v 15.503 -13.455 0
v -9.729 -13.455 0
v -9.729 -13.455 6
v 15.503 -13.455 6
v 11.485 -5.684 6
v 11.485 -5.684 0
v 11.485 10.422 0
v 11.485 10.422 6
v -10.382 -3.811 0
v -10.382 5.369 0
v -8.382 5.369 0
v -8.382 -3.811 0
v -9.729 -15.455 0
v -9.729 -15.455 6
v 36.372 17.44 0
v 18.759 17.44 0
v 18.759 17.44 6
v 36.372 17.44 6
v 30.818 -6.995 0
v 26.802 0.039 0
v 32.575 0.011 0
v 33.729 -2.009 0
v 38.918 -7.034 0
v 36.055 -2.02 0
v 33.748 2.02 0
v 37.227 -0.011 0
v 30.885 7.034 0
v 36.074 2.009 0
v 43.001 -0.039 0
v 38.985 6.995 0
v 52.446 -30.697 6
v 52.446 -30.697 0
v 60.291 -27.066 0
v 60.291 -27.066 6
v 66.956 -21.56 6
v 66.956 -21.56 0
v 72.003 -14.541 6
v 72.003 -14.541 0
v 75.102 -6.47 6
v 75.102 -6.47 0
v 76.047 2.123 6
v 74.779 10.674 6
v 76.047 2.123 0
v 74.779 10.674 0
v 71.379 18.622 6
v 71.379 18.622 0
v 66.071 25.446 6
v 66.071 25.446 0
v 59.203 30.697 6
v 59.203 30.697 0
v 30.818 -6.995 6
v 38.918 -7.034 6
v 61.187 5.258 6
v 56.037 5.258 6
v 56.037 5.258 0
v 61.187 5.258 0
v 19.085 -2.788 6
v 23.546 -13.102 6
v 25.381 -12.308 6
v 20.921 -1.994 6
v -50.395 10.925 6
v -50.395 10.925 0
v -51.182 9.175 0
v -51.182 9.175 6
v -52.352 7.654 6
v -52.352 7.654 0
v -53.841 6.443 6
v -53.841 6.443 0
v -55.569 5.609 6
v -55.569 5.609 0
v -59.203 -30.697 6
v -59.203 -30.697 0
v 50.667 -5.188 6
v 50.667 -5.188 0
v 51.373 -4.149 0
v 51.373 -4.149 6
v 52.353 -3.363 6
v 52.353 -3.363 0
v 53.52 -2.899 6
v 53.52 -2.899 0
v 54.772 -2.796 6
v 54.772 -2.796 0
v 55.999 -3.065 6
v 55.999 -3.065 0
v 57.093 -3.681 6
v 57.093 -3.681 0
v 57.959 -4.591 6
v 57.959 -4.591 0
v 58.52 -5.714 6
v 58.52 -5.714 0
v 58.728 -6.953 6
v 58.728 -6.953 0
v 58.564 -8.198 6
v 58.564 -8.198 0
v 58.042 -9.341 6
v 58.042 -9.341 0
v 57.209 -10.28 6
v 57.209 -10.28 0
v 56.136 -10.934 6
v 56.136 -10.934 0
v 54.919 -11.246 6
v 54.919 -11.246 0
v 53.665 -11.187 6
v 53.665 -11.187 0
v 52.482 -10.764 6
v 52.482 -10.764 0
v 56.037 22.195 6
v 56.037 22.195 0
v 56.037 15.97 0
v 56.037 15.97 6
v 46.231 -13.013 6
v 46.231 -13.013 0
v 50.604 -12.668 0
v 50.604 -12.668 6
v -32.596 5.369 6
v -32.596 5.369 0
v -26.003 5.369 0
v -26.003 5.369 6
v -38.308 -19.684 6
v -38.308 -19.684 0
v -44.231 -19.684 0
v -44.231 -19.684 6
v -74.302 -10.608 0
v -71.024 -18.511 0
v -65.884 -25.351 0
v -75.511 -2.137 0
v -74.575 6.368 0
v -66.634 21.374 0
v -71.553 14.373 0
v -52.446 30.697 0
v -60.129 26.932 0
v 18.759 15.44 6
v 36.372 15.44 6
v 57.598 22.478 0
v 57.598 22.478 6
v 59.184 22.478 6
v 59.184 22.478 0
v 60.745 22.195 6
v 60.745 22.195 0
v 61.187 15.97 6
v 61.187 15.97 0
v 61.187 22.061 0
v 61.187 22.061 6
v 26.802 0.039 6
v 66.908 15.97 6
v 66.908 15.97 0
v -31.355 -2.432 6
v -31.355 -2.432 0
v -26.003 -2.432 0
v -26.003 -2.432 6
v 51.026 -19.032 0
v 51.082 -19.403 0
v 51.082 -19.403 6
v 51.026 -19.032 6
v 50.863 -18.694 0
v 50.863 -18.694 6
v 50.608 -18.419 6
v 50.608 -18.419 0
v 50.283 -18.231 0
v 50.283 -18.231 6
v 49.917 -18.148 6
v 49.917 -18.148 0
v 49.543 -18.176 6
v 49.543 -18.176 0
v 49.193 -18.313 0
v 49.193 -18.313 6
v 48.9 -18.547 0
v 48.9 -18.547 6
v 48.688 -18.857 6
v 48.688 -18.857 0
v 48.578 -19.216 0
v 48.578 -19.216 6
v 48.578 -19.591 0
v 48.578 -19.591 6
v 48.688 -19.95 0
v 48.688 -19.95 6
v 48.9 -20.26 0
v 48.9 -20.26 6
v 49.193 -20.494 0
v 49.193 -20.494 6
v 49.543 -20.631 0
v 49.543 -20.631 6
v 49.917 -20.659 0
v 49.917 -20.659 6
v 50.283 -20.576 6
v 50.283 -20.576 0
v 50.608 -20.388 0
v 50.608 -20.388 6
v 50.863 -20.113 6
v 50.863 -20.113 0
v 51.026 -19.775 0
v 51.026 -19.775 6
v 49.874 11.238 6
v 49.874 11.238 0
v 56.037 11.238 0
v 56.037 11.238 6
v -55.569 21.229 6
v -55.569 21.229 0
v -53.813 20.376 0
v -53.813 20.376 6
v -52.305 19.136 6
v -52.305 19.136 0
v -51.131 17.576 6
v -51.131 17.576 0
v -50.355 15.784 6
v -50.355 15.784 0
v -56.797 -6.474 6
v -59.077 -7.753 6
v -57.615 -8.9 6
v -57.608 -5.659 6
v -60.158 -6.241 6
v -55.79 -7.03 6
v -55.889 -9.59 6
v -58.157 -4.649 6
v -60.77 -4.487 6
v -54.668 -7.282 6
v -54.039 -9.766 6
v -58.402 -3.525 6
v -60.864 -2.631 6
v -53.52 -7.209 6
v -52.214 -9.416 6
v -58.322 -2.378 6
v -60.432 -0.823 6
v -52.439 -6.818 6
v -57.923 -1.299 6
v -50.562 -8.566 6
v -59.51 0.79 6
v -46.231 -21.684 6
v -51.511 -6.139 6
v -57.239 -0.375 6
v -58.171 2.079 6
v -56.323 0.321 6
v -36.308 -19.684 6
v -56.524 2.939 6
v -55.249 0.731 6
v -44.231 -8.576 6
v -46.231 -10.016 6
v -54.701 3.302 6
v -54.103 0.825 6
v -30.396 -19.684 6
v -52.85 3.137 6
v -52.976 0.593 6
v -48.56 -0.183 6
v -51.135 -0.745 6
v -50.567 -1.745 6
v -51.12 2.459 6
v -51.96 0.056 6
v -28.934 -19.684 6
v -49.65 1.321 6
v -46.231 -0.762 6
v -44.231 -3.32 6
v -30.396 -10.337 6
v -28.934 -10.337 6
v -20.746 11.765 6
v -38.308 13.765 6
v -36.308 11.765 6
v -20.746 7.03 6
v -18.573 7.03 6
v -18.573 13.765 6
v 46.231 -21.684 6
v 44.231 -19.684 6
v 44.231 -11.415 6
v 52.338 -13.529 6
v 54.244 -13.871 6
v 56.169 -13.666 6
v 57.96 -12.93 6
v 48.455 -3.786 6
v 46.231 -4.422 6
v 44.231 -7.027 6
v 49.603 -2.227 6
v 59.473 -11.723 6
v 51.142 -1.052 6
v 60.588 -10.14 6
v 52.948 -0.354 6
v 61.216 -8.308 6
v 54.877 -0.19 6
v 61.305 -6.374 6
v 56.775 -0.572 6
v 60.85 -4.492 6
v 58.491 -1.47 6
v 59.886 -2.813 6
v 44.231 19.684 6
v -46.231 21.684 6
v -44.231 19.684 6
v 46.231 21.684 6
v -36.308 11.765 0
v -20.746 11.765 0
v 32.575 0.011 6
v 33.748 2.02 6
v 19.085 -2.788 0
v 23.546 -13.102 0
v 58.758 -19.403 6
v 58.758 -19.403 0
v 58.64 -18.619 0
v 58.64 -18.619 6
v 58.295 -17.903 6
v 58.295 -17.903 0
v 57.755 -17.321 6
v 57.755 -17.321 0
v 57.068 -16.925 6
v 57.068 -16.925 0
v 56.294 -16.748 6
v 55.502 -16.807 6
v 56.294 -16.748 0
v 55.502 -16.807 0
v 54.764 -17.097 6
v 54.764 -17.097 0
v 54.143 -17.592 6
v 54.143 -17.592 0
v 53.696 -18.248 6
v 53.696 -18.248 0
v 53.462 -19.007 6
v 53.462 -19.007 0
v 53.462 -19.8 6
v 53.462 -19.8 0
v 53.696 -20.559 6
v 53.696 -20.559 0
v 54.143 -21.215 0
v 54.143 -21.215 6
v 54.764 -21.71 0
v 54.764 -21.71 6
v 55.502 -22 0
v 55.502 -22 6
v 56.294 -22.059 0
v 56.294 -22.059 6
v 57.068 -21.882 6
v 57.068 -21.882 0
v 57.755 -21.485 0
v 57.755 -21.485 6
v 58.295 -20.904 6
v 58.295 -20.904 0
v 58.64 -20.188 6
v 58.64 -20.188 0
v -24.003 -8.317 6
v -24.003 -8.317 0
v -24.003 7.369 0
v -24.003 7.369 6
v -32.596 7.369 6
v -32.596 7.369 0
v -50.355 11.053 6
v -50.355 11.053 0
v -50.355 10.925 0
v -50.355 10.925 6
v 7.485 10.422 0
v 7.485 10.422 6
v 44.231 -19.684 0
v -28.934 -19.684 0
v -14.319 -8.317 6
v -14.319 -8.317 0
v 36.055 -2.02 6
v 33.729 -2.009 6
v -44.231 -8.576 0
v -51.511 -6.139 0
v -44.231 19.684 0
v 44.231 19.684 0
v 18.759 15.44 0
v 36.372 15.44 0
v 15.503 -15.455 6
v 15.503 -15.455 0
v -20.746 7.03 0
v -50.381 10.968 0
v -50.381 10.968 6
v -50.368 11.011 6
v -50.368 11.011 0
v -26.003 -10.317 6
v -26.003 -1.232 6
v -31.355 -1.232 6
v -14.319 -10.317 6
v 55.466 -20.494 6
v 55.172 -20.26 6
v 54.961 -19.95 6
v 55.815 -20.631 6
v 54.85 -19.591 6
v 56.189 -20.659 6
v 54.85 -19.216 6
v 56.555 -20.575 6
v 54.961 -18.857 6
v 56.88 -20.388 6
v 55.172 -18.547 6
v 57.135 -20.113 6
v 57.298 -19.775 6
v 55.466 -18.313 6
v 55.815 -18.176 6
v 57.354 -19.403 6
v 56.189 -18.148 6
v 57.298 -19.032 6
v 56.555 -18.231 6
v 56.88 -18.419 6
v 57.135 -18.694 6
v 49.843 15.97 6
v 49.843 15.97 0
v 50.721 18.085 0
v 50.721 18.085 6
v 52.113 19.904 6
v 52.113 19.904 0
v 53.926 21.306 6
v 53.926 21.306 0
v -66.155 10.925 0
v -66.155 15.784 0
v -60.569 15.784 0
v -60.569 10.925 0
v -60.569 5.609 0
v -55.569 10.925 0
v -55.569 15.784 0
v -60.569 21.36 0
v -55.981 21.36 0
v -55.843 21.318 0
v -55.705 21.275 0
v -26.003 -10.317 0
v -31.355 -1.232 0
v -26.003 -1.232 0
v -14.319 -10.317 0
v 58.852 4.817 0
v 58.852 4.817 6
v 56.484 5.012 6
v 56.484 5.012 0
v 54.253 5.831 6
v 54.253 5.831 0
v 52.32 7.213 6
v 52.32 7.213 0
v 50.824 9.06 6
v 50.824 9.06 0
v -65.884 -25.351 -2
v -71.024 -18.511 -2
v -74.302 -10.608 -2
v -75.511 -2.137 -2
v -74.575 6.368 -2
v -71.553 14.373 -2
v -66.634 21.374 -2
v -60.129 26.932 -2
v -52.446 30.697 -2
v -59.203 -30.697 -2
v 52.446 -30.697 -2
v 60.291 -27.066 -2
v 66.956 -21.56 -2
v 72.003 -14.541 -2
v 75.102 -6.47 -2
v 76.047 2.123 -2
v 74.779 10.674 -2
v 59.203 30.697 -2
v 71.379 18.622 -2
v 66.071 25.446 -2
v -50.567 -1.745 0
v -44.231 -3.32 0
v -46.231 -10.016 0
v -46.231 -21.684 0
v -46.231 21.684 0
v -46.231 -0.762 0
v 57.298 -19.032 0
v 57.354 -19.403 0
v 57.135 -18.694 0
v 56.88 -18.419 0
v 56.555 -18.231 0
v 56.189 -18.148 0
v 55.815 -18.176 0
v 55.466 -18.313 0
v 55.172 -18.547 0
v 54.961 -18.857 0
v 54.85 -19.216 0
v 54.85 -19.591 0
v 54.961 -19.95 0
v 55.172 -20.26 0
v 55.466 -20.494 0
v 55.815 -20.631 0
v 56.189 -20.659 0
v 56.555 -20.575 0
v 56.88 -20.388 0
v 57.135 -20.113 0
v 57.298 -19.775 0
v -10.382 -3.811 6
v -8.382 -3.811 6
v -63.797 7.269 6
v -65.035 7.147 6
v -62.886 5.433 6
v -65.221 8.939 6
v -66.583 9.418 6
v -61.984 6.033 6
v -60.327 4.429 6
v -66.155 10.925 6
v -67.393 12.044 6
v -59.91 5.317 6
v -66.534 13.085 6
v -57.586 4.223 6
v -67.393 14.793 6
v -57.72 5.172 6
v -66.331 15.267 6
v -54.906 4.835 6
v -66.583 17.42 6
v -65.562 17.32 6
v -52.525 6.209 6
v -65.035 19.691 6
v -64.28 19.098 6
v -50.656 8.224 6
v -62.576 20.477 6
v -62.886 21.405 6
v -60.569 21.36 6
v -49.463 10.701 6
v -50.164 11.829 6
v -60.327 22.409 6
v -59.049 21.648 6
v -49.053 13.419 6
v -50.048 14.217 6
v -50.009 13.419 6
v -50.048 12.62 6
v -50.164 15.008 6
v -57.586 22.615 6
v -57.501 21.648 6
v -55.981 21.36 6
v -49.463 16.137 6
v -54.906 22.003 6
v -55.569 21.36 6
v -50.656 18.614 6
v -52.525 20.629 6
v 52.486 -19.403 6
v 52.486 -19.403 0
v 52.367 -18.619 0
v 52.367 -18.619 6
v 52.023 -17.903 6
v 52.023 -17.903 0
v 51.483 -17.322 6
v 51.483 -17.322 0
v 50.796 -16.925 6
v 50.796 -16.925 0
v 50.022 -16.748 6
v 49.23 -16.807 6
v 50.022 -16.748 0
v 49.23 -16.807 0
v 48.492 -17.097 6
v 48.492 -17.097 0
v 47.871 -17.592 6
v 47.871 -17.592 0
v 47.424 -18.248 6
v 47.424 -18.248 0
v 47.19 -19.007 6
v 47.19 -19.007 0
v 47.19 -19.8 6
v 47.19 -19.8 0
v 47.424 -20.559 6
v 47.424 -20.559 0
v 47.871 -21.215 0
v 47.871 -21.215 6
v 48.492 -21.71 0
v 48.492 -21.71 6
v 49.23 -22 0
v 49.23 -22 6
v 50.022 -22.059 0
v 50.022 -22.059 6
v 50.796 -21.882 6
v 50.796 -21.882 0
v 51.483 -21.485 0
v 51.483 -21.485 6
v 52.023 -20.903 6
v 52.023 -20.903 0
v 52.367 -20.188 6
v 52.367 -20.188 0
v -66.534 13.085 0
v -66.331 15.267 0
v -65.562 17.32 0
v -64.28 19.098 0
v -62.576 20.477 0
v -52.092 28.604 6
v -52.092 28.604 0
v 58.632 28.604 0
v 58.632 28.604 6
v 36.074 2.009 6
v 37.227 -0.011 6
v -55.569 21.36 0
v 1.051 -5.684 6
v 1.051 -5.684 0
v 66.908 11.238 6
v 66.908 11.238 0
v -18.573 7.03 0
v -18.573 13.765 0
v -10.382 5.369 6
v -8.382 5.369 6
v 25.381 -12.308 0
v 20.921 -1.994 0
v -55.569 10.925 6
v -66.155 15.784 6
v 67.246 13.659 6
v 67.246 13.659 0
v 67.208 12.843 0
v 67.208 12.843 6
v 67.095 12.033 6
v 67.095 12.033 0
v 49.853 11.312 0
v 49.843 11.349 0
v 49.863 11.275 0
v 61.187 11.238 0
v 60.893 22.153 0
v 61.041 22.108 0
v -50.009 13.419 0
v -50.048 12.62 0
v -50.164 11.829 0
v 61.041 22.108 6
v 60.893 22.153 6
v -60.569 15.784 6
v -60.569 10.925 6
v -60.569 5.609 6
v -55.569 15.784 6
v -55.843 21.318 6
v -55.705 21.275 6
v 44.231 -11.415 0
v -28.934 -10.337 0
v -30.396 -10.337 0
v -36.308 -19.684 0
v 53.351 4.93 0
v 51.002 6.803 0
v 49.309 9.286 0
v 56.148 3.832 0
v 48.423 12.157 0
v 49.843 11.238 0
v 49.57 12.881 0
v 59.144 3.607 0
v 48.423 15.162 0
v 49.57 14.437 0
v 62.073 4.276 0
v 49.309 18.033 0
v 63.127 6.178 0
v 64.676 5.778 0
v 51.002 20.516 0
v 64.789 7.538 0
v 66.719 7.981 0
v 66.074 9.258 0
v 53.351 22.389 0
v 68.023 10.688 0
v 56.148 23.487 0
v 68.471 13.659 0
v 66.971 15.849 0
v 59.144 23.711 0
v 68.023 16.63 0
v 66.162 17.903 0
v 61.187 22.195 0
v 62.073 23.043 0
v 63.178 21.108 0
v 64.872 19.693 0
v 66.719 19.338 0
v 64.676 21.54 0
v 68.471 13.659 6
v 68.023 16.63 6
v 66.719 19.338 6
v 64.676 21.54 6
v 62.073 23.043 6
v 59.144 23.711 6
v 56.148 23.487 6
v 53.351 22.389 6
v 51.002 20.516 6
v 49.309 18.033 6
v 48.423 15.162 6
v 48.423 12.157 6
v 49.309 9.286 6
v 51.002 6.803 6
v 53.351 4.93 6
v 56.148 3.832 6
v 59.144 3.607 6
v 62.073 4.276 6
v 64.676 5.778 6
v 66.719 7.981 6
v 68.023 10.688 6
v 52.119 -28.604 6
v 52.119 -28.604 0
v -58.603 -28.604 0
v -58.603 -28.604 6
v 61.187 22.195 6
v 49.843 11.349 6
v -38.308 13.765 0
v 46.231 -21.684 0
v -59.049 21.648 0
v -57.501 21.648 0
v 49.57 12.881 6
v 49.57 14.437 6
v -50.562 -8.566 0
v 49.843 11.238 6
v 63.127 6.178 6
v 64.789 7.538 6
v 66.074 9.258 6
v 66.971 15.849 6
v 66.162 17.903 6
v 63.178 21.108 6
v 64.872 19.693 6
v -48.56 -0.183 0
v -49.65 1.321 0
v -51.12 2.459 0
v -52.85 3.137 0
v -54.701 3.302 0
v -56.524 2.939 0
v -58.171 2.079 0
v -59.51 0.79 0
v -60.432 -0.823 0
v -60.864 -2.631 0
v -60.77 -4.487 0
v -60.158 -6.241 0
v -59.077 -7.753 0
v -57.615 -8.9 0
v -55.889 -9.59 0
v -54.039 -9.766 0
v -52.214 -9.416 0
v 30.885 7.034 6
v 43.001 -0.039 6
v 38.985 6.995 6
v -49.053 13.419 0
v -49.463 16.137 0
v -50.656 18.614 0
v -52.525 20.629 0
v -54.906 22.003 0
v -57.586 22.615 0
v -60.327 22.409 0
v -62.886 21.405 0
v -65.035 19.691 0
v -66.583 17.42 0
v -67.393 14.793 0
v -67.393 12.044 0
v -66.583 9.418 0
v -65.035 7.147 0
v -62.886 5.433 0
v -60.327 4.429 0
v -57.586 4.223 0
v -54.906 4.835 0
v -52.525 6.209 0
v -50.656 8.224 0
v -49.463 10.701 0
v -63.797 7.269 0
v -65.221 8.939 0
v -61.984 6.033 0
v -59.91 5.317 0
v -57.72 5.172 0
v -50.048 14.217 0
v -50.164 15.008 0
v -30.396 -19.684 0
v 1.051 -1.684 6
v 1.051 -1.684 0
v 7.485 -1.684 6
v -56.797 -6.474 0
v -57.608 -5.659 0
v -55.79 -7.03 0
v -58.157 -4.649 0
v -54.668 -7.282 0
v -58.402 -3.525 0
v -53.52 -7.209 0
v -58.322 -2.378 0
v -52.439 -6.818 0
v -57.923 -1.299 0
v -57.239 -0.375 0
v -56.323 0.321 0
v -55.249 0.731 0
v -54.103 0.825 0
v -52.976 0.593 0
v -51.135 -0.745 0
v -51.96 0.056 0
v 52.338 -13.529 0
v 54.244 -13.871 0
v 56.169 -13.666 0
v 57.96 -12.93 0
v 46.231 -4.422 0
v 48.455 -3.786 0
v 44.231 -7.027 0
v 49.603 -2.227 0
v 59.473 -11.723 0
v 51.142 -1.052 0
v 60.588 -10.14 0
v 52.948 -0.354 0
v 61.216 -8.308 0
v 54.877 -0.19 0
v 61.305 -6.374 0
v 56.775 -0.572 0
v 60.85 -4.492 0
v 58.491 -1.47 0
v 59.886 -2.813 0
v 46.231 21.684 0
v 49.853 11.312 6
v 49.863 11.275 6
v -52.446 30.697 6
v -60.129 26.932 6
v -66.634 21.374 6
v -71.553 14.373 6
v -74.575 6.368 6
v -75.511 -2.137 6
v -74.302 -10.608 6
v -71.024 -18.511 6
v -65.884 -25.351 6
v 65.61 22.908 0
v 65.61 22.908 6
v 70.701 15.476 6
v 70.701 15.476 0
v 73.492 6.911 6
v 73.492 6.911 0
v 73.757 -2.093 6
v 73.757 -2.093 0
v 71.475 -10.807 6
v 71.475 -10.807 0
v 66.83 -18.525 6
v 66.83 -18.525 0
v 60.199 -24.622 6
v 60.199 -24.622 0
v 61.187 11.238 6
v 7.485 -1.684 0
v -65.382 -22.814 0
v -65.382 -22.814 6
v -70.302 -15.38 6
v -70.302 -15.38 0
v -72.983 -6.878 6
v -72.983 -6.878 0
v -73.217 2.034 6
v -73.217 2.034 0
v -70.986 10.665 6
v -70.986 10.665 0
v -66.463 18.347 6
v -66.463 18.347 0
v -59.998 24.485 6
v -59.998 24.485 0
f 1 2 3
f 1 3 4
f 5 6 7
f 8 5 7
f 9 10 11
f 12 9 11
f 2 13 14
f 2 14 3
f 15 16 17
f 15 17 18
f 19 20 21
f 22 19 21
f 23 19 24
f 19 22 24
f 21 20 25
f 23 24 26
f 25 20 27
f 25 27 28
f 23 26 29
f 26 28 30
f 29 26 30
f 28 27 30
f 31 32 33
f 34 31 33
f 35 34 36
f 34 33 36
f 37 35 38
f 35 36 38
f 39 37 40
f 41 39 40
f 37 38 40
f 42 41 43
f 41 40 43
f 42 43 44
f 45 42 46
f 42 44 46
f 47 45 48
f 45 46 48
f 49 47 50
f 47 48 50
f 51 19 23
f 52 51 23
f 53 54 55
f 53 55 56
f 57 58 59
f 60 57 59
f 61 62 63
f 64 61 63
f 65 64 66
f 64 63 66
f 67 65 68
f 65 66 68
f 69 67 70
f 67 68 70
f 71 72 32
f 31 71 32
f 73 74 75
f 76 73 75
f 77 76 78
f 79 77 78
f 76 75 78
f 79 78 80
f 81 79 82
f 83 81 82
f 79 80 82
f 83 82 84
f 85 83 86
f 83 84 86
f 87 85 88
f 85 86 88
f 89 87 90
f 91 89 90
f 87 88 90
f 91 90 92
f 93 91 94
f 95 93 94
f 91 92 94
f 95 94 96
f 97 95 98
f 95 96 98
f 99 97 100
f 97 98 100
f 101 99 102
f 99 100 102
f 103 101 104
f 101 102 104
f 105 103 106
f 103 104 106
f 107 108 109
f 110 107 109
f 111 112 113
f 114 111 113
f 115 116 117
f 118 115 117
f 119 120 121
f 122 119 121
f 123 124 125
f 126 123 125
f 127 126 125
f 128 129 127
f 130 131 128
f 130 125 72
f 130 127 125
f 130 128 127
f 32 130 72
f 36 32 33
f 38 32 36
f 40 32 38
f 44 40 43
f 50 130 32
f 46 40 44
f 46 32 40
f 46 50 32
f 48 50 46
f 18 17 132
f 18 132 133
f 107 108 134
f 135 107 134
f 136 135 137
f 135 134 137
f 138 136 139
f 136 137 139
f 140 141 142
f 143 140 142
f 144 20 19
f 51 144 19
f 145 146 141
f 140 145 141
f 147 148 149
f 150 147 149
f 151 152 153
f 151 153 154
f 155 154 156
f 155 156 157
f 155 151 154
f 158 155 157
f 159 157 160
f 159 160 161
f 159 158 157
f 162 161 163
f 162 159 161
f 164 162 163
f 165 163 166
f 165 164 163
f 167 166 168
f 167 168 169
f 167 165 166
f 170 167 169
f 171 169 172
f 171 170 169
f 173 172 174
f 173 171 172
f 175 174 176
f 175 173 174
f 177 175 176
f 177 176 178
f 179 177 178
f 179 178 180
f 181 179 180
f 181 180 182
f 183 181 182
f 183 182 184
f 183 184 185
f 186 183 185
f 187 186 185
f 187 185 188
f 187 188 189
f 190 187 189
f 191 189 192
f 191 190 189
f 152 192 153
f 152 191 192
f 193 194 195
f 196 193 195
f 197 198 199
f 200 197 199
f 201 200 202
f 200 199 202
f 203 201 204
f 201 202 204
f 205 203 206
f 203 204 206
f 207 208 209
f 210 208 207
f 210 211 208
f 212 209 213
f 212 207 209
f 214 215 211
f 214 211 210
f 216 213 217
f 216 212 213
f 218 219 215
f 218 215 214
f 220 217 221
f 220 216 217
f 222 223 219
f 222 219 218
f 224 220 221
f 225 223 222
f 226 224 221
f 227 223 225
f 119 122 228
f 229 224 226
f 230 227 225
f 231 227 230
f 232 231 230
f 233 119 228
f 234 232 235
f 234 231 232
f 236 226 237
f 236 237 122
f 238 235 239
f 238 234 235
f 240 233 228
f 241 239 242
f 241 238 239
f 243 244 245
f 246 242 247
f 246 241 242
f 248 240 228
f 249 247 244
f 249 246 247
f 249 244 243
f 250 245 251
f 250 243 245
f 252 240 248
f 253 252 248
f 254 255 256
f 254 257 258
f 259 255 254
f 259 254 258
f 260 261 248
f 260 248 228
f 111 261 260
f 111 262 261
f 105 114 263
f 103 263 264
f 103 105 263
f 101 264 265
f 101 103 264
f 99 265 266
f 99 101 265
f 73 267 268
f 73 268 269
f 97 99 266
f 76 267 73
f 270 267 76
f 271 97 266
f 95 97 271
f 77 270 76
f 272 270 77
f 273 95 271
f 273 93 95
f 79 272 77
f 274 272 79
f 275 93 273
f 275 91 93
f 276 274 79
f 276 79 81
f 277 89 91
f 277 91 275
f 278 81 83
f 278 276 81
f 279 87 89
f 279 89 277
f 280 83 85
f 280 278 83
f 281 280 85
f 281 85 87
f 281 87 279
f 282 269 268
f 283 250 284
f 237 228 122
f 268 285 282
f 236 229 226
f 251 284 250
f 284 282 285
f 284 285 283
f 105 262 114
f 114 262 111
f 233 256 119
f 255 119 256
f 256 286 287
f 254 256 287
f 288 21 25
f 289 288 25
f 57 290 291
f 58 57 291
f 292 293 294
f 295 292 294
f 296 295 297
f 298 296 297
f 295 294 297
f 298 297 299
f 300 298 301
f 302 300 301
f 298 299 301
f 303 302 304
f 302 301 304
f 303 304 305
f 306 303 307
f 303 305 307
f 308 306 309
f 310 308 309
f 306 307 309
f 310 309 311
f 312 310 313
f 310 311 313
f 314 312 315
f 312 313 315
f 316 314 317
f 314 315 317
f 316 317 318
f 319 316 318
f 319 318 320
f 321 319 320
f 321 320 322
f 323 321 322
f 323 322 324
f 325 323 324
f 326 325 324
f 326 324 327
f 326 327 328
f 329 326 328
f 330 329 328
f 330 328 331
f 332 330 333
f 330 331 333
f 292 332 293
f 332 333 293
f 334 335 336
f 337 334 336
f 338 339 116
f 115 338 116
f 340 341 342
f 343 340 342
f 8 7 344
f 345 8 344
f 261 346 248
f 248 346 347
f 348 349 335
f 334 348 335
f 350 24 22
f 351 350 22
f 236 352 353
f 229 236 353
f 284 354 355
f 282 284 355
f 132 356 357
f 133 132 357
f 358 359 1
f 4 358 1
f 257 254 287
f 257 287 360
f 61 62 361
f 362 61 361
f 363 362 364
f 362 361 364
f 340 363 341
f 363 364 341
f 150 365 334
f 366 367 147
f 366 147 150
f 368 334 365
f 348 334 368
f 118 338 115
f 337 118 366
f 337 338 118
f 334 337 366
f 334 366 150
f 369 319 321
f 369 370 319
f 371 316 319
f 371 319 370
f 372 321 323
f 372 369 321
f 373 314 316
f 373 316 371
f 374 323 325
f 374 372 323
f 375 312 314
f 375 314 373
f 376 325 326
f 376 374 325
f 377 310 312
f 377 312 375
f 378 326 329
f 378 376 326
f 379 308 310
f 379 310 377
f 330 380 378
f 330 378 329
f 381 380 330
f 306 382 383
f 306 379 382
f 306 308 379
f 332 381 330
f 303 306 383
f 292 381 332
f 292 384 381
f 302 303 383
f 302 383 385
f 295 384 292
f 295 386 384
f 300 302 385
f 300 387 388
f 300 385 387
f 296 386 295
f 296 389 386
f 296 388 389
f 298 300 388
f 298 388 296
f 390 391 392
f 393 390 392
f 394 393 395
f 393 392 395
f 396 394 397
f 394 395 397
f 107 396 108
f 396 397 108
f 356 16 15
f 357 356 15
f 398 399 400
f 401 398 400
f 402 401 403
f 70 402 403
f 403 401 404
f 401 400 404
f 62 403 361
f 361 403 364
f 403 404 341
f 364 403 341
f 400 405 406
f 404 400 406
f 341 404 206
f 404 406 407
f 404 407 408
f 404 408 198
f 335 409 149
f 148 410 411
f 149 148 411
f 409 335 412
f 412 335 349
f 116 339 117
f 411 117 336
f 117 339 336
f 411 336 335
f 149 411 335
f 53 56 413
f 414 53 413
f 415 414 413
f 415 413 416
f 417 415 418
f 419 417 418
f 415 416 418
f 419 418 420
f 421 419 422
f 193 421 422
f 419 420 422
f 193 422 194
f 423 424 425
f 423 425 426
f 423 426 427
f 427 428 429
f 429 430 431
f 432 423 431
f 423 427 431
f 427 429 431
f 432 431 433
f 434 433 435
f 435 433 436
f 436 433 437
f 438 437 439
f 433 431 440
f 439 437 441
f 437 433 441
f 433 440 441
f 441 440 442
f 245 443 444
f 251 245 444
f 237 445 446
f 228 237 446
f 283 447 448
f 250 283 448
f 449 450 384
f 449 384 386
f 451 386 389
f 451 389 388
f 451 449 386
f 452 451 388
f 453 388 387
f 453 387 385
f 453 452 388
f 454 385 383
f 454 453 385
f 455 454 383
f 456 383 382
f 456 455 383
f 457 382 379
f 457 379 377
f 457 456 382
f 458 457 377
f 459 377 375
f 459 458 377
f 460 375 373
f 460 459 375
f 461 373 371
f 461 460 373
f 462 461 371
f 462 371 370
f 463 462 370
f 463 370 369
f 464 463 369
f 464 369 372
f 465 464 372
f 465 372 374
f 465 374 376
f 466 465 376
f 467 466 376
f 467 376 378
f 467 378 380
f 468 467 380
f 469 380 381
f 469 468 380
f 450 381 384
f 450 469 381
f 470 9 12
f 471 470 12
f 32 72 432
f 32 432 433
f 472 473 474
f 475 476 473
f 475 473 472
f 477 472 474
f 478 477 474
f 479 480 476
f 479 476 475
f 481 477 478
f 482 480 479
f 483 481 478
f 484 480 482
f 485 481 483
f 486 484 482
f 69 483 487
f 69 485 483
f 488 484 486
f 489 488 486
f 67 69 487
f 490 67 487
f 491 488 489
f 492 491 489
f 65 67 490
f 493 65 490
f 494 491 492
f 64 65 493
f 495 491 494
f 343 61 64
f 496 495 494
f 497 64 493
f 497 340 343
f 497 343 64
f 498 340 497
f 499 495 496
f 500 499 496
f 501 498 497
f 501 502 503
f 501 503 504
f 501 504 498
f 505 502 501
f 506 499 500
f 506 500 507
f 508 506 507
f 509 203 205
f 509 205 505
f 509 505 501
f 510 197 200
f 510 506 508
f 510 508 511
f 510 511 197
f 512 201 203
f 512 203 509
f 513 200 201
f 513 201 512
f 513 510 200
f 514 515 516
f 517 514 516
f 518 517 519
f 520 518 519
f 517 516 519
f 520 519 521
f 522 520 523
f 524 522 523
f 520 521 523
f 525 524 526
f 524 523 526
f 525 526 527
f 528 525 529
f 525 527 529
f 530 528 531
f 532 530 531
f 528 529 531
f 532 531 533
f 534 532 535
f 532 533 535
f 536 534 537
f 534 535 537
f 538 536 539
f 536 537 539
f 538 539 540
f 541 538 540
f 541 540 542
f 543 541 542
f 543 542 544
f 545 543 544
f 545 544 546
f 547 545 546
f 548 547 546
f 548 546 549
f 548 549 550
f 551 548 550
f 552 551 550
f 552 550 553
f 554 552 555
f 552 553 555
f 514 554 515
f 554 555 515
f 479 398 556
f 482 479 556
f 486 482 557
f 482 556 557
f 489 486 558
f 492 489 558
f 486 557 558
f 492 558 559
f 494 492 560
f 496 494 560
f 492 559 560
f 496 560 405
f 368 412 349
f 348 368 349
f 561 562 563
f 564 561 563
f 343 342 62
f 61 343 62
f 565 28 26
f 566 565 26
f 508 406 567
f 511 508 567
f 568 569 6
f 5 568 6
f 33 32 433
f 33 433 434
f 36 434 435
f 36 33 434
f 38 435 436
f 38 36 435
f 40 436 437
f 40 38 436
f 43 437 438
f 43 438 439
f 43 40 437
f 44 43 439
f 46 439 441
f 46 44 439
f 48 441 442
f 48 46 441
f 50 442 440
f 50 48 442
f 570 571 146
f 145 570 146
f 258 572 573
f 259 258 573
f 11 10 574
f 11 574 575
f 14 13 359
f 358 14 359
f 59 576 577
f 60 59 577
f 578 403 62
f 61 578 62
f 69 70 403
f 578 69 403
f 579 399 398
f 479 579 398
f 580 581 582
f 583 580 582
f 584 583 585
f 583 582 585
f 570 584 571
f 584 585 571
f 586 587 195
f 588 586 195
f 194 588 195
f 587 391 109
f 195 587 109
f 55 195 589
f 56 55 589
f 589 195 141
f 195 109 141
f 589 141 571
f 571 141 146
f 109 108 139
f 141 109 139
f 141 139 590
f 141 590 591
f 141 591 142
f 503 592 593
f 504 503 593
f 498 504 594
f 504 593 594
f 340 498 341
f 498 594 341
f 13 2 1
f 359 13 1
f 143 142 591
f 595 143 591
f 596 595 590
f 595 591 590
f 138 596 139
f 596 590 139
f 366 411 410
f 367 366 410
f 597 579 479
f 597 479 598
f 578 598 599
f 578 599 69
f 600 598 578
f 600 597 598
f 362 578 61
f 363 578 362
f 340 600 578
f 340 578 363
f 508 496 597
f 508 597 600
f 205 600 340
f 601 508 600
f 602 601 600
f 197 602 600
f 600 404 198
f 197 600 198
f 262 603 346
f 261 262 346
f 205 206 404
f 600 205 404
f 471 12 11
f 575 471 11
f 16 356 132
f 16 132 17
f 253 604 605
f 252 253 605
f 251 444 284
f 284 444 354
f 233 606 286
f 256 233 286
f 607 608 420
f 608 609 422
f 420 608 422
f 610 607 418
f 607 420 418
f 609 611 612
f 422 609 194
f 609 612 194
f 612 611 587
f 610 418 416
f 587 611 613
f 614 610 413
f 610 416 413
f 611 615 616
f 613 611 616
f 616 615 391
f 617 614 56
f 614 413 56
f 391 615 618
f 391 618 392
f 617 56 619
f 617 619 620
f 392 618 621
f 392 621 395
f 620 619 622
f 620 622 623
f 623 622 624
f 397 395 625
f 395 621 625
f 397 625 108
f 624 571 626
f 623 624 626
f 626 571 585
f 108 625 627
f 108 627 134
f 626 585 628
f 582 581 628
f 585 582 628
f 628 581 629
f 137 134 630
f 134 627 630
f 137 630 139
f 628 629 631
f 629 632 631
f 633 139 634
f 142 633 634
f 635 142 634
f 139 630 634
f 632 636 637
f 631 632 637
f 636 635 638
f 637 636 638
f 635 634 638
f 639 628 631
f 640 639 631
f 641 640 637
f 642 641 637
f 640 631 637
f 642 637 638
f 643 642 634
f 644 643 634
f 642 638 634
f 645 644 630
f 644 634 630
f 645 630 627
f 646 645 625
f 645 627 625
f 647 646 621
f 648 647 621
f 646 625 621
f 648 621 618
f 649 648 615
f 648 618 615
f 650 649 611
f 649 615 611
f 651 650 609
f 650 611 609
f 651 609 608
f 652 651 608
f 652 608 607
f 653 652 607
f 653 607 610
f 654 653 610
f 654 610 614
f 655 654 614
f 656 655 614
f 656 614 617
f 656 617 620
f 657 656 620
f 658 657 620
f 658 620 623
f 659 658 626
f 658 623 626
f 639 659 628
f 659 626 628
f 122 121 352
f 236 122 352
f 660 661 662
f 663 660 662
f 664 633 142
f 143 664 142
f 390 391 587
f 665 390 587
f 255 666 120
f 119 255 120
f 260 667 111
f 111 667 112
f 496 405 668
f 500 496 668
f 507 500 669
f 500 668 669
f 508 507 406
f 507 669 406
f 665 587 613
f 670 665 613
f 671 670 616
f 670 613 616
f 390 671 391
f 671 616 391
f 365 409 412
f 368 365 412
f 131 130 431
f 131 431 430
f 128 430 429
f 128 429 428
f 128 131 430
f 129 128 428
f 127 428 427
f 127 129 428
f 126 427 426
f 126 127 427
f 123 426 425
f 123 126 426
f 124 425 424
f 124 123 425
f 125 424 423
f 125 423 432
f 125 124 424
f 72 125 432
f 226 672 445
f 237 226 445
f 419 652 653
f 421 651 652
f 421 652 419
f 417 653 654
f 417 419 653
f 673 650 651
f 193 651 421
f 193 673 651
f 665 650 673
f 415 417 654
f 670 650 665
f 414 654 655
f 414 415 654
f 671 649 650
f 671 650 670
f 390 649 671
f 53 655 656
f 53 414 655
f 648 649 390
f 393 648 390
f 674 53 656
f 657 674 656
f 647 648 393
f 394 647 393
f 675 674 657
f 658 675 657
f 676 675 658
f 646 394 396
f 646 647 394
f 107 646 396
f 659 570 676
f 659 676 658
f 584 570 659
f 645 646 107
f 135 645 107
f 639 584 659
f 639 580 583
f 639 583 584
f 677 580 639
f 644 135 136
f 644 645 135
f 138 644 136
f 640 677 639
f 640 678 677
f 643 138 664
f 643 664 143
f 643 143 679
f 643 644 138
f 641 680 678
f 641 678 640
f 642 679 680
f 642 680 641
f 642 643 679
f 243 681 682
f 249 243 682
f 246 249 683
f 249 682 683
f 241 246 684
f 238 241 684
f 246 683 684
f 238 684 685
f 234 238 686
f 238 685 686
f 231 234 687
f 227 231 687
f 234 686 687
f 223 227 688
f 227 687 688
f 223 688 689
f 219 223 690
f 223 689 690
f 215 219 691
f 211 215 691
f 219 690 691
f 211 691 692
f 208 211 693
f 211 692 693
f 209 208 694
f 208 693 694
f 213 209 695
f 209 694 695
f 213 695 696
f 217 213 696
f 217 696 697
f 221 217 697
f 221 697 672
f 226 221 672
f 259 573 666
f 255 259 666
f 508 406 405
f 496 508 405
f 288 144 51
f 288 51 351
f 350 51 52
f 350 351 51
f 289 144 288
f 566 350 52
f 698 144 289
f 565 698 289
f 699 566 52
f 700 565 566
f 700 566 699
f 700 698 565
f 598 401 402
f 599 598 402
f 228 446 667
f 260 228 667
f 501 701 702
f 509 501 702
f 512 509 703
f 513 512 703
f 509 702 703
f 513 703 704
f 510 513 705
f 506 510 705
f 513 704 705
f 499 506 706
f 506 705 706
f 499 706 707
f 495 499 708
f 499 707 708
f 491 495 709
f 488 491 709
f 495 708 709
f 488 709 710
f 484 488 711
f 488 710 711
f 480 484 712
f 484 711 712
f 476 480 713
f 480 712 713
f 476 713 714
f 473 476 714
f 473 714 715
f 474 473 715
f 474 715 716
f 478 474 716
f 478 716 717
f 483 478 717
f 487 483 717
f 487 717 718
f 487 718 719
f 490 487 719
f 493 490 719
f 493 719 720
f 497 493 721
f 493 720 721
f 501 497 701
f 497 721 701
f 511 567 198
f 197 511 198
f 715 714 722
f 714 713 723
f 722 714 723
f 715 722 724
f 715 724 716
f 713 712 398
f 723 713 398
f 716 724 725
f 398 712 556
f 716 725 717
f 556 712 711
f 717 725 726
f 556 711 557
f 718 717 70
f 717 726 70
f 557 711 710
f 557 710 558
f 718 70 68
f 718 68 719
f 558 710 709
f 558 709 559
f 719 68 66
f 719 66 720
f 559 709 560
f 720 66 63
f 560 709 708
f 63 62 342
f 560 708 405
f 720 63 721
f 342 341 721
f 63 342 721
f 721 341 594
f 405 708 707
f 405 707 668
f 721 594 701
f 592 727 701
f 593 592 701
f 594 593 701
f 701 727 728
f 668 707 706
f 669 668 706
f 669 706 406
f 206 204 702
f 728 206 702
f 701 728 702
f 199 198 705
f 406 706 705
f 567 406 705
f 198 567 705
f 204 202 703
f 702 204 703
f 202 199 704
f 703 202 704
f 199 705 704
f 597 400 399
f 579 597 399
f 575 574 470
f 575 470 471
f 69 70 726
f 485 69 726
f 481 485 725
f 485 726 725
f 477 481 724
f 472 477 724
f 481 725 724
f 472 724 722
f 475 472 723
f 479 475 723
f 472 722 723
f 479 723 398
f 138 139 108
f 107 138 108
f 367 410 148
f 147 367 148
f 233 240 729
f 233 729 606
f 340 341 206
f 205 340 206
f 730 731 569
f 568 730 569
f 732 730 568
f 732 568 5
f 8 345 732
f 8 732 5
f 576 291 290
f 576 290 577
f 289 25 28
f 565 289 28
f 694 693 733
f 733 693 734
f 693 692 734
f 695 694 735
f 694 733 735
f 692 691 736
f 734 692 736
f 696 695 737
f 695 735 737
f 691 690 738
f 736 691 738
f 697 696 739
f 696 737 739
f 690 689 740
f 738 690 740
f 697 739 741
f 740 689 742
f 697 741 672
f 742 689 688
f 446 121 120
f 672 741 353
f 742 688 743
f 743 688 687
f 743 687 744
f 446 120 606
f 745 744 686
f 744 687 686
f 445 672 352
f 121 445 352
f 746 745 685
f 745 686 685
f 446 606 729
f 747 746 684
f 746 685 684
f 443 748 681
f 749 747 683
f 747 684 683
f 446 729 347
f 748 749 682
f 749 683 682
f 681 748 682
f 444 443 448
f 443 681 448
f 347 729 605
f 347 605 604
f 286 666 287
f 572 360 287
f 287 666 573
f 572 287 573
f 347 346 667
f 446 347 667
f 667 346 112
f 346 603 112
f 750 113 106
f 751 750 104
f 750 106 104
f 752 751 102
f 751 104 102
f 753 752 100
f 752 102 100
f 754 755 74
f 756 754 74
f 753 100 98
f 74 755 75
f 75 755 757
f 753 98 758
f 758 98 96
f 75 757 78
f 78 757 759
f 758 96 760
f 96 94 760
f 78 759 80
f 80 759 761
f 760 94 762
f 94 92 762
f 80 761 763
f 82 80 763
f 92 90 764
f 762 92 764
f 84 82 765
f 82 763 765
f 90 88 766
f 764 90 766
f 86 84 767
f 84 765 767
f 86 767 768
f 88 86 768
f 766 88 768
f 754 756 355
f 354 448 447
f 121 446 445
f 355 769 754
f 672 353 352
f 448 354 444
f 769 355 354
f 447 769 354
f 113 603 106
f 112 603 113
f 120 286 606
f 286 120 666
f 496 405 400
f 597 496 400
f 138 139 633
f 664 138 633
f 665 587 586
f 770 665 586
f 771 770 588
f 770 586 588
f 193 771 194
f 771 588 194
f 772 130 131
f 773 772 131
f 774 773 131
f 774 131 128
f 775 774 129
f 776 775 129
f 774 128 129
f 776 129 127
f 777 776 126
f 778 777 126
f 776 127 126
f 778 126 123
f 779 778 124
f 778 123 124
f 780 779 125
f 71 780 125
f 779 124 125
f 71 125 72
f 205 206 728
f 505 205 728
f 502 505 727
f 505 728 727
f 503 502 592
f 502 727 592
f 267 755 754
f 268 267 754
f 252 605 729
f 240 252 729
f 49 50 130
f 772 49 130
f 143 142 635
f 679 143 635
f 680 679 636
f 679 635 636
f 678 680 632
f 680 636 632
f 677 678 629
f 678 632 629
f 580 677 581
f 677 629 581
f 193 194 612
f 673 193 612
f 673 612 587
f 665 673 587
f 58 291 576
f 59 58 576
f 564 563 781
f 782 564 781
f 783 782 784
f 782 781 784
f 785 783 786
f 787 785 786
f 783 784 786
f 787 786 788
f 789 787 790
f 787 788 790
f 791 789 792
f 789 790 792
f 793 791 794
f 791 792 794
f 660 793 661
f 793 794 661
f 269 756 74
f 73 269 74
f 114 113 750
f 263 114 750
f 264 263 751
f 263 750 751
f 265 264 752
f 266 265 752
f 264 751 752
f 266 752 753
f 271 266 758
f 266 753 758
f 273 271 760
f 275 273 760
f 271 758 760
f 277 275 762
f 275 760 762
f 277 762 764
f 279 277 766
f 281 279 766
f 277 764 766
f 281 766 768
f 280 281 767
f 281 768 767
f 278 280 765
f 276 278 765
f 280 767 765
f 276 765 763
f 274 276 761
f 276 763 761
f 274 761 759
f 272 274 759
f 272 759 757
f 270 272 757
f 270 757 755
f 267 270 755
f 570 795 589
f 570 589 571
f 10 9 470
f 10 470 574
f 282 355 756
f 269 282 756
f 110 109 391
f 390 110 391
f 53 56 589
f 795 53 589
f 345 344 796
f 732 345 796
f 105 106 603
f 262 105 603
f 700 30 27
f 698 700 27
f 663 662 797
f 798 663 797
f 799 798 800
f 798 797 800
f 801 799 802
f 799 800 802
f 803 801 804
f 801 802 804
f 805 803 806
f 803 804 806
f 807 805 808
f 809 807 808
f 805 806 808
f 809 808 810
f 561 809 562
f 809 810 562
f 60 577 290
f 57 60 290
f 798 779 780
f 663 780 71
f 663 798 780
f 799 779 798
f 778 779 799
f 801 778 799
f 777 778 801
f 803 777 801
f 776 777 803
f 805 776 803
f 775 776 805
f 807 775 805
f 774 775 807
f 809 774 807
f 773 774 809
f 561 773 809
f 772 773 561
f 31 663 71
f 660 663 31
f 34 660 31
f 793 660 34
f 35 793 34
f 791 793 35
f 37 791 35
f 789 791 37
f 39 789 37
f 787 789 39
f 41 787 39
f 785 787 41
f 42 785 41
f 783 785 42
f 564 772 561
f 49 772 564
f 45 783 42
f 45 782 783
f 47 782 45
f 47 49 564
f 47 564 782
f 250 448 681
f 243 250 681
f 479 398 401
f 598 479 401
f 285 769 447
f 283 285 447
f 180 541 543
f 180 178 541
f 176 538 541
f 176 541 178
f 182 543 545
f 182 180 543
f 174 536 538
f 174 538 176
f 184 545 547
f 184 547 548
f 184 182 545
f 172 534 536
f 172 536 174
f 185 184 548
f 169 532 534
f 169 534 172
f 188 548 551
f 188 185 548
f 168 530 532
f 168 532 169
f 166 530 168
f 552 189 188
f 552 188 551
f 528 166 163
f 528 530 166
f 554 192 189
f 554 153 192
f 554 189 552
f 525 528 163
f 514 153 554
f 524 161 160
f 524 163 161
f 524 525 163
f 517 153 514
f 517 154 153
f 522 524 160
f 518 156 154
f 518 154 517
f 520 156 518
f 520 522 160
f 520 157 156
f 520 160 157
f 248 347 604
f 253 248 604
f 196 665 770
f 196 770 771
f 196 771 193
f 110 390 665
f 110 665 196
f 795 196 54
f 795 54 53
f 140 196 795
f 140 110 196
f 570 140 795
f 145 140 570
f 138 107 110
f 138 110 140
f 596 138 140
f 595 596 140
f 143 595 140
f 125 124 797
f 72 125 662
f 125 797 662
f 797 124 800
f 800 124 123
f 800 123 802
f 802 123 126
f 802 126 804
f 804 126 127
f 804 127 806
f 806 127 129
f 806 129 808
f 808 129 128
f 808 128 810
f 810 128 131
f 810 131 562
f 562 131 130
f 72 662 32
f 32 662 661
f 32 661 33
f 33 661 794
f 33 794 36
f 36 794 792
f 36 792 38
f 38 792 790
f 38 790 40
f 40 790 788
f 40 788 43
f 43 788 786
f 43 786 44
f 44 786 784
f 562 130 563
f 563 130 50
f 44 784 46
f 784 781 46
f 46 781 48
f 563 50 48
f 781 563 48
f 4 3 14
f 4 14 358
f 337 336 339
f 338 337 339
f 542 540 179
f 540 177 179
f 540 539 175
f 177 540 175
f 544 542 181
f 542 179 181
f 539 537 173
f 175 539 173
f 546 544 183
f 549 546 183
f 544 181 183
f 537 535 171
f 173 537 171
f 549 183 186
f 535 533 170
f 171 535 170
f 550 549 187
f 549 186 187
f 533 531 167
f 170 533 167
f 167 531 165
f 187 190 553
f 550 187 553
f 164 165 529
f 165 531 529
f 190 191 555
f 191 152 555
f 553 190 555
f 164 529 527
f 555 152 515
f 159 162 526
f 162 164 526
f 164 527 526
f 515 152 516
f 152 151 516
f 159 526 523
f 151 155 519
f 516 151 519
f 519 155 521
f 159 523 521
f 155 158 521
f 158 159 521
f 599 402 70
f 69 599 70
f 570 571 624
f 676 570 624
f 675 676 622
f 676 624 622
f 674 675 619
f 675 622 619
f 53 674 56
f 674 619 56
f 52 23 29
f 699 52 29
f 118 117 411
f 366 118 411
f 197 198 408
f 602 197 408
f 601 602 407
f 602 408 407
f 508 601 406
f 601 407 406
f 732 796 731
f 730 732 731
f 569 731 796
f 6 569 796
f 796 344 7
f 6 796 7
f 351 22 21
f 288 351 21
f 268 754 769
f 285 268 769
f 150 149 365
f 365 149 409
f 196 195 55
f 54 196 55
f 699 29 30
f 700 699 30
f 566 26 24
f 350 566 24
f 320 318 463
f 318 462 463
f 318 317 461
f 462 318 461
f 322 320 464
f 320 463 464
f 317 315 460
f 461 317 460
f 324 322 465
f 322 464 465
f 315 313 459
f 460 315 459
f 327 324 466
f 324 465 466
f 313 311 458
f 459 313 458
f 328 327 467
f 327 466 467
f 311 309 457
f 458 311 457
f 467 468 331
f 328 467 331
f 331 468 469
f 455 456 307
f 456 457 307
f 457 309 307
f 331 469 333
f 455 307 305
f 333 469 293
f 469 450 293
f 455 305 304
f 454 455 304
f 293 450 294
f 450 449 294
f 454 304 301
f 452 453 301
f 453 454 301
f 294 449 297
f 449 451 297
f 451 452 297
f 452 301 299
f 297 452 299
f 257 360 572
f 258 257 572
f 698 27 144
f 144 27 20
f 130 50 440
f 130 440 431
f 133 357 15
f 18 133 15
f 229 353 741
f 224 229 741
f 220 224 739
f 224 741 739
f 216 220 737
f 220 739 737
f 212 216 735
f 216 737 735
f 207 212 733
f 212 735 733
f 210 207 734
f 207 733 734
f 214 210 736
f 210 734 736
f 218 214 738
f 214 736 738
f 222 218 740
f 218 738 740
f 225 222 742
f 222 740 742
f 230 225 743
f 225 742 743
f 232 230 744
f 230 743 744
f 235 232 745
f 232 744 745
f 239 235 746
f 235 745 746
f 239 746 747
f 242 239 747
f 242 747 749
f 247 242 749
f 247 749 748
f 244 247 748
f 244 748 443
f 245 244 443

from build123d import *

# Parameters (mm, degrees)
F0_R     = 9.221546
F0_W     = 2
F0_H     = 9.17971
F0_W_2   = 25.23225
F0_H_2   = 2
F0_W_3   = 17.612288
F0_R_2   = 10.080126
F0_R_3   = 2.662862
F0_R_4   = 1.25932
F0_R_5   = 2.663
F0_R_6   = 1.259
F1_DEPTH = 6
F3_DEPTH = 2


with BuildPart() as f1:
    # F0 (on Top) → F1 (new body)
    with BuildSketch(Plane.XY):
        with BuildLine():
            Line((59.203275, 30.697015), (-52.445677, 30.697015))
            ThreePointArc((-52.445677, 30.697015), (-75.3106, 2.144824), (-59.203275, -30.697015))
            Line((-59.203275, -30.697015), (52.445677, -30.697015))
            ThreePointArc((52.445677, -30.697015), (75.850891, -2.204293), (59.203275, 30.697015))
        make_face()
        with BuildLine():
            ThreePointArc((-58.603486, -28.603842), (-73.216754, 2.034064), (-52.091513, 28.603842))
            Line((-52.091513, 28.603842), (58.631942, 28.603842))
            ThreePointArc((58.631942, 28.603842), (73.757121, -2.092843), (52.118627, -28.603842))
            Line((52.118627, -28.603842), (-58.603486, -28.603842))
        make_face(mode=Mode.SUBTRACT)
        with Locations((-58.274889, 13.418862)):
            Circle(F0_R)
        with BuildLine():
            ThreePointArc((-50.355197, 15.784443), (-50.096343, 14.614219), (-50.00945, 13.418862))
            ThreePointArc((-50.00945, 13.418862), (-50.096343, 12.223505), (-50.355197, 11.053282))
            Line((-50.355197, 11.053282), (-50.355197, 10.925333))
            Line((-50.355197, 10.925333), (-50.394547, 10.925333))
            ThreePointArc((-50.394547, 10.925333), (-52.351717, 7.65401), (-55.568827, 5.608951))
            ThreePointArc((-55.568827, 5.608951), (-61.984238, 6.032509), (-66.155231, 10.925333))
            ThreePointArc((-66.155231, 10.925333), (-65.561691, 17.320144), (-60.568827, 21.359601))
            ThreePointArc((-60.568827, 21.359601), (-58.274889, 21.684301), (-55.98095, 21.359601))
            Line((-55.98095, 21.359601), (-55.568827, 21.359601))
            Line((-55.568827, 21.359601), (-55.568827, 21.228774))
            ThreePointArc((-55.568827, 21.228774), (-52.305229, 19.135561), (-50.355197, 15.784443))
        make_face(mode=Mode.SUBTRACT)
        with BuildLine():
            Line((-55.568827, 15.784443), (-55.568827, 21.228774))
            ThreePointArc((-55.568827, 21.228774), (-55.774033, 21.296883), (-55.98095, 21.359601))
            Line((-55.98095, 21.359601), (-60.568827, 21.359601))
            Line((-60.568827, 21.359601), (-60.568827, 15.784443))
            Line((-60.568827, 15.784443), (-58.274889, 13.418862))
            Line((-58.274889, 13.418862), (-55.568827, 15.784443))
        make_face()
        Polygon((-55.568827, 10.925333), (-58.274889, 13.418862), (-60.568827, 10.925333), (-60.568827, 5.608951), (-55.568827, 5.608951), align=None)
        Polygon((-60.568827, 10.925333), (-58.274889, 13.418862), (-60.568827, 15.784443), (-66.155231, 15.784443), (-66.155231, 10.925333), align=None)
        with BuildLine():
            Line((-50.355197, 11.053282), (-50.355197, 15.784443))
            Line((-50.355197, 15.784443), (-55.568827, 15.784443))
            Line((-55.568827, 15.784443), (-58.274889, 13.418862))
            Line((-58.274889, 13.418862), (-55.568827, 10.925333))
            Line((-55.568827, 10.925333), (-50.394547, 10.925333))
            ThreePointArc((-50.394547, 10.925333), (-50.374613, 10.989227), (-50.355197, 11.053282))
        make_face()
        with BuildLine():
            Line((46.230912, 21.684301), (-46.230912, 21.684301))
            Line((-46.230912, 21.684301), (-46.230912, -0.761901))
            Line((-46.230912, -0.761901), (-48.559715, -0.183279))
            ThreePointArc((-48.559715, -0.183279), (-60.712459, -1.711494), (-50.56159, -8.566017))
            Line((-50.56159, -8.566017), (-46.230912, -10.015758))
            Line((-46.230912, -10.015758), (-46.230912, -21.684301))
            Line((-46.230912, -21.684301), (46.230912, -21.684301))
            Line((46.230912, -21.684301), (46.230912, -13.012726))
            Line((46.230912, -13.012726), (50.603963, -12.66764))
            ThreePointArc((50.603963, -12.66764), (61.144533, -5.416616), (48.455043, -3.786341))
            Line((48.455043, -3.786341), (46.230912, -4.421907))
            Line((46.230912, -4.421907), (46.230912, 21.684301))
        make_face()
        with BuildLine():
            ThreePointArc((-51.510783, -6.139175), (-58.321678, -2.377691), (-50.566858, -1.745387))
            Line((-50.566858, -1.745387), (-44.230912, -3.319638))
            Line((-44.230912, -3.319638), (-44.230912, 19.684301))
            Line((-44.230912, 19.684301), (44.230912, 19.684301))
            Line((44.230912, 19.684301), (44.230912, -7.027197))
            Line((44.230912, -7.027197), (50.667065, -5.188005))
            ThreePointArc((50.667065, -5.188005), (58.520469, -5.714323), (52.482387, -10.763534))
            Line((52.482387, -10.763534), (44.230912, -11.414674))
            Line((44.230912, -11.414674), (44.230912, -19.684301))
            Line((44.230912, -19.684301), (-28.933741, -19.684301))
            Line((-28.933741, -19.684301), (-30.395584, -19.684301))
            Line((-30.395584, -19.684301), (-36.308002, -19.684301))
            Line((-36.308002, -19.684301), (-38.308002, -19.684301))
            Line((-38.308002, -19.684301), (-44.230912, -19.684301))
            Line((-44.230912, -19.684301), (-44.230912, -8.576191))
            Line((-44.230912, -8.576191), (-51.510783, -6.139175))
        make_face(mode=Mode.SUBTRACT)
        Polygon((-24.002813, 7.368693), (-32.595631, 7.368693), (-32.595631, 5.368693), (-26.002813, 5.368693), (-26.002813, -1.231665), (-31.35518, -1.231665), (-31.35518, -2.431665), (-26.002813, -2.431665), (-26.002813, -10.316606), (-14.318847, -10.316606), (-14.318847, -8.316606), (-24.002813, -8.316606), align=None)
        Polygon((43.0009, -0.038784), (38.984752, 6.994956), (30.885281, 7.03374), (26.801958, 0.038784), (30.818106, -6.994956), (38.917577, -7.03374), align=None)
        Polygon((33.728766, -2.008836), (32.575394, 0.011138), (33.748057, 2.019974), (36.074092, 2.008836), (37.227464, -0.011138), (36.0548, -2.019974), align=None, mode=Mode.SUBTRACT)
        with Locations((-9.382453, 0.778838)):
            Rectangle(F0_W, F0_H)
        with Locations((2.887357, -14.454821)):
            Rectangle(F0_W_2, F0_H_2)
        Polygon((20.921205, -1.993789), (19.085491, -2.787611), (23.545668, -13.101771), (25.381382, -12.307948), align=None)
        with Locations((27.565426, 16.440073)):
            Rectangle(F0_W_3, F0_H_2)
        with Locations((58.390804, 13.659293)):
            Circle(F0_R_2)
        with BuildLine():
            ThreePointArc((49.842759, 15.969712), (52.113468, 19.904463), (56.036502, 22.195355))
            ThreePointArc((56.036502, 22.195355), (58.390804, 22.514071), (60.745105, 22.195355))
            Line((60.745105, 22.195355), (61.187022, 22.195355))
            Line((61.187022, 22.195355), (61.187022, 22.060975))
            ThreePointArc((61.187022, 22.060975), (65.572969, 18.838443), (67.245582, 13.659293))
            ThreePointArc((67.245582, 13.659293), (67.160773, 12.436703), (66.907973, 11.237532))
            ThreePointArc((66.907973, 11.237532), (64.789089, 7.538096), (61.187022, 5.257611))
            ThreePointArc((61.187022, 5.257611), (54.252908, 5.830825), (49.873634, 11.237532))
            Line((49.873634, 11.237532), (49.842759, 11.237532))
            Line((49.842759, 11.237532), (49.842759, 11.348874))
            ThreePointArc((49.842759, 11.348874), (49.536025, 13.659293), (49.842759, 15.969712))
        make_face(mode=Mode.SUBTRACT)
        with BuildLine():
            Line((60.745105, 22.195355), (56.036502, 22.195355))
            Line((56.036502, 22.195355), (56.036502, 15.969712))
            Line((56.036502, 15.969712), (58.611762, 13.603622))
            Line((58.611762, 13.603622), (61.187022, 15.969712))
            Line((61.187022, 15.969712), (61.187022, 22.060975))
            ThreePointArc((61.187022, 22.060975), (60.96694, 22.131047), (60.745105, 22.195355))
        make_face()
        Polygon((61.187022, 15.969712), (58.611762, 13.603622), (61.187022, 11.237532), (66.907973, 11.237532), (66.907973, 15.969712), align=None)
        with BuildLine():
            Line((56.036502, 15.969712), (49.842759, 15.969712))
            Line((49.842759, 15.969712), (49.842759, 11.348874))
            ThreePointArc((49.842759, 11.348874), (49.858015, 11.293153), (49.873634, 11.237532))
            Line((49.873634, 11.237532), (56.036502, 11.237532))
            Line((56.036502, 11.237532), (58.611762, 13.603622))
            Line((58.611762, 13.603622), (56.036502, 15.969712))
        make_face()
        Polygon((61.187022, 11.237532), (58.611762, 13.603622), (56.036502, 11.237532), (56.036502, 5.257611), (61.187022, 5.257611), align=None)
        with Locations((49.822934, -19.403439)):
            Circle(F0_R_3)
        with Locations((49.822934, -19.403439)):
            Circle(F0_R_4, mode=Mode.SUBTRACT)
        with Locations((56.095056, -19.403439)):
            Circle(F0_R_5)
        with Locations((56.095056, -19.403439)):
            Circle(F0_R_6, mode=Mode.SUBTRACT)
        Polygon((-38.308002, 13.765193), (-38.308002, -19.684301), (-36.308002, -19.684301), (-36.308002, -19.672696), (-36.308002, 11.765193), (-20.746052, 11.765193), (-20.746052, 7.030077), (-18.573044, 7.030077), (-18.573044, 13.765193), (-20.746052, 13.765193), align=None)
        Polygon((-30.395584, -10.337325), (-30.395584, -19.684301), (-28.933741, -19.684301), (-28.933741, -19.672696), (-28.933741, -10.337325), align=None)
        Polygon((11.484839, -5.684367), (11.484839, 10.42243), (7.484839, 10.42243), (7.484839, 10.387363), (7.484839, -1.684367), (1.051139, -1.684367), (1.051139, -5.684367), align=None)
    extrude(amount=F1_DEPTH)


with BuildPart() as f3:
    # F2 (on Top) → F3 (new body)
    with BuildSketch(Plane.XY):
        with BuildLine():
            ThreePointArc((-52.445677, 30.697015), (-75.3106, 2.144824), (-59.203275, -30.697015))
            Line((-59.203275, -30.697015), (52.445677, -30.697015))
            ThreePointArc((52.445677, -30.697015), (75.850891, -2.204293), (59.203275, 30.697015))
            Line((59.203275, 30.697015), (-52.445677, 30.697015))
        make_face()
    extrude(amount=-F3_DEPTH)


solid = Compound([f1.part, f3.part])
